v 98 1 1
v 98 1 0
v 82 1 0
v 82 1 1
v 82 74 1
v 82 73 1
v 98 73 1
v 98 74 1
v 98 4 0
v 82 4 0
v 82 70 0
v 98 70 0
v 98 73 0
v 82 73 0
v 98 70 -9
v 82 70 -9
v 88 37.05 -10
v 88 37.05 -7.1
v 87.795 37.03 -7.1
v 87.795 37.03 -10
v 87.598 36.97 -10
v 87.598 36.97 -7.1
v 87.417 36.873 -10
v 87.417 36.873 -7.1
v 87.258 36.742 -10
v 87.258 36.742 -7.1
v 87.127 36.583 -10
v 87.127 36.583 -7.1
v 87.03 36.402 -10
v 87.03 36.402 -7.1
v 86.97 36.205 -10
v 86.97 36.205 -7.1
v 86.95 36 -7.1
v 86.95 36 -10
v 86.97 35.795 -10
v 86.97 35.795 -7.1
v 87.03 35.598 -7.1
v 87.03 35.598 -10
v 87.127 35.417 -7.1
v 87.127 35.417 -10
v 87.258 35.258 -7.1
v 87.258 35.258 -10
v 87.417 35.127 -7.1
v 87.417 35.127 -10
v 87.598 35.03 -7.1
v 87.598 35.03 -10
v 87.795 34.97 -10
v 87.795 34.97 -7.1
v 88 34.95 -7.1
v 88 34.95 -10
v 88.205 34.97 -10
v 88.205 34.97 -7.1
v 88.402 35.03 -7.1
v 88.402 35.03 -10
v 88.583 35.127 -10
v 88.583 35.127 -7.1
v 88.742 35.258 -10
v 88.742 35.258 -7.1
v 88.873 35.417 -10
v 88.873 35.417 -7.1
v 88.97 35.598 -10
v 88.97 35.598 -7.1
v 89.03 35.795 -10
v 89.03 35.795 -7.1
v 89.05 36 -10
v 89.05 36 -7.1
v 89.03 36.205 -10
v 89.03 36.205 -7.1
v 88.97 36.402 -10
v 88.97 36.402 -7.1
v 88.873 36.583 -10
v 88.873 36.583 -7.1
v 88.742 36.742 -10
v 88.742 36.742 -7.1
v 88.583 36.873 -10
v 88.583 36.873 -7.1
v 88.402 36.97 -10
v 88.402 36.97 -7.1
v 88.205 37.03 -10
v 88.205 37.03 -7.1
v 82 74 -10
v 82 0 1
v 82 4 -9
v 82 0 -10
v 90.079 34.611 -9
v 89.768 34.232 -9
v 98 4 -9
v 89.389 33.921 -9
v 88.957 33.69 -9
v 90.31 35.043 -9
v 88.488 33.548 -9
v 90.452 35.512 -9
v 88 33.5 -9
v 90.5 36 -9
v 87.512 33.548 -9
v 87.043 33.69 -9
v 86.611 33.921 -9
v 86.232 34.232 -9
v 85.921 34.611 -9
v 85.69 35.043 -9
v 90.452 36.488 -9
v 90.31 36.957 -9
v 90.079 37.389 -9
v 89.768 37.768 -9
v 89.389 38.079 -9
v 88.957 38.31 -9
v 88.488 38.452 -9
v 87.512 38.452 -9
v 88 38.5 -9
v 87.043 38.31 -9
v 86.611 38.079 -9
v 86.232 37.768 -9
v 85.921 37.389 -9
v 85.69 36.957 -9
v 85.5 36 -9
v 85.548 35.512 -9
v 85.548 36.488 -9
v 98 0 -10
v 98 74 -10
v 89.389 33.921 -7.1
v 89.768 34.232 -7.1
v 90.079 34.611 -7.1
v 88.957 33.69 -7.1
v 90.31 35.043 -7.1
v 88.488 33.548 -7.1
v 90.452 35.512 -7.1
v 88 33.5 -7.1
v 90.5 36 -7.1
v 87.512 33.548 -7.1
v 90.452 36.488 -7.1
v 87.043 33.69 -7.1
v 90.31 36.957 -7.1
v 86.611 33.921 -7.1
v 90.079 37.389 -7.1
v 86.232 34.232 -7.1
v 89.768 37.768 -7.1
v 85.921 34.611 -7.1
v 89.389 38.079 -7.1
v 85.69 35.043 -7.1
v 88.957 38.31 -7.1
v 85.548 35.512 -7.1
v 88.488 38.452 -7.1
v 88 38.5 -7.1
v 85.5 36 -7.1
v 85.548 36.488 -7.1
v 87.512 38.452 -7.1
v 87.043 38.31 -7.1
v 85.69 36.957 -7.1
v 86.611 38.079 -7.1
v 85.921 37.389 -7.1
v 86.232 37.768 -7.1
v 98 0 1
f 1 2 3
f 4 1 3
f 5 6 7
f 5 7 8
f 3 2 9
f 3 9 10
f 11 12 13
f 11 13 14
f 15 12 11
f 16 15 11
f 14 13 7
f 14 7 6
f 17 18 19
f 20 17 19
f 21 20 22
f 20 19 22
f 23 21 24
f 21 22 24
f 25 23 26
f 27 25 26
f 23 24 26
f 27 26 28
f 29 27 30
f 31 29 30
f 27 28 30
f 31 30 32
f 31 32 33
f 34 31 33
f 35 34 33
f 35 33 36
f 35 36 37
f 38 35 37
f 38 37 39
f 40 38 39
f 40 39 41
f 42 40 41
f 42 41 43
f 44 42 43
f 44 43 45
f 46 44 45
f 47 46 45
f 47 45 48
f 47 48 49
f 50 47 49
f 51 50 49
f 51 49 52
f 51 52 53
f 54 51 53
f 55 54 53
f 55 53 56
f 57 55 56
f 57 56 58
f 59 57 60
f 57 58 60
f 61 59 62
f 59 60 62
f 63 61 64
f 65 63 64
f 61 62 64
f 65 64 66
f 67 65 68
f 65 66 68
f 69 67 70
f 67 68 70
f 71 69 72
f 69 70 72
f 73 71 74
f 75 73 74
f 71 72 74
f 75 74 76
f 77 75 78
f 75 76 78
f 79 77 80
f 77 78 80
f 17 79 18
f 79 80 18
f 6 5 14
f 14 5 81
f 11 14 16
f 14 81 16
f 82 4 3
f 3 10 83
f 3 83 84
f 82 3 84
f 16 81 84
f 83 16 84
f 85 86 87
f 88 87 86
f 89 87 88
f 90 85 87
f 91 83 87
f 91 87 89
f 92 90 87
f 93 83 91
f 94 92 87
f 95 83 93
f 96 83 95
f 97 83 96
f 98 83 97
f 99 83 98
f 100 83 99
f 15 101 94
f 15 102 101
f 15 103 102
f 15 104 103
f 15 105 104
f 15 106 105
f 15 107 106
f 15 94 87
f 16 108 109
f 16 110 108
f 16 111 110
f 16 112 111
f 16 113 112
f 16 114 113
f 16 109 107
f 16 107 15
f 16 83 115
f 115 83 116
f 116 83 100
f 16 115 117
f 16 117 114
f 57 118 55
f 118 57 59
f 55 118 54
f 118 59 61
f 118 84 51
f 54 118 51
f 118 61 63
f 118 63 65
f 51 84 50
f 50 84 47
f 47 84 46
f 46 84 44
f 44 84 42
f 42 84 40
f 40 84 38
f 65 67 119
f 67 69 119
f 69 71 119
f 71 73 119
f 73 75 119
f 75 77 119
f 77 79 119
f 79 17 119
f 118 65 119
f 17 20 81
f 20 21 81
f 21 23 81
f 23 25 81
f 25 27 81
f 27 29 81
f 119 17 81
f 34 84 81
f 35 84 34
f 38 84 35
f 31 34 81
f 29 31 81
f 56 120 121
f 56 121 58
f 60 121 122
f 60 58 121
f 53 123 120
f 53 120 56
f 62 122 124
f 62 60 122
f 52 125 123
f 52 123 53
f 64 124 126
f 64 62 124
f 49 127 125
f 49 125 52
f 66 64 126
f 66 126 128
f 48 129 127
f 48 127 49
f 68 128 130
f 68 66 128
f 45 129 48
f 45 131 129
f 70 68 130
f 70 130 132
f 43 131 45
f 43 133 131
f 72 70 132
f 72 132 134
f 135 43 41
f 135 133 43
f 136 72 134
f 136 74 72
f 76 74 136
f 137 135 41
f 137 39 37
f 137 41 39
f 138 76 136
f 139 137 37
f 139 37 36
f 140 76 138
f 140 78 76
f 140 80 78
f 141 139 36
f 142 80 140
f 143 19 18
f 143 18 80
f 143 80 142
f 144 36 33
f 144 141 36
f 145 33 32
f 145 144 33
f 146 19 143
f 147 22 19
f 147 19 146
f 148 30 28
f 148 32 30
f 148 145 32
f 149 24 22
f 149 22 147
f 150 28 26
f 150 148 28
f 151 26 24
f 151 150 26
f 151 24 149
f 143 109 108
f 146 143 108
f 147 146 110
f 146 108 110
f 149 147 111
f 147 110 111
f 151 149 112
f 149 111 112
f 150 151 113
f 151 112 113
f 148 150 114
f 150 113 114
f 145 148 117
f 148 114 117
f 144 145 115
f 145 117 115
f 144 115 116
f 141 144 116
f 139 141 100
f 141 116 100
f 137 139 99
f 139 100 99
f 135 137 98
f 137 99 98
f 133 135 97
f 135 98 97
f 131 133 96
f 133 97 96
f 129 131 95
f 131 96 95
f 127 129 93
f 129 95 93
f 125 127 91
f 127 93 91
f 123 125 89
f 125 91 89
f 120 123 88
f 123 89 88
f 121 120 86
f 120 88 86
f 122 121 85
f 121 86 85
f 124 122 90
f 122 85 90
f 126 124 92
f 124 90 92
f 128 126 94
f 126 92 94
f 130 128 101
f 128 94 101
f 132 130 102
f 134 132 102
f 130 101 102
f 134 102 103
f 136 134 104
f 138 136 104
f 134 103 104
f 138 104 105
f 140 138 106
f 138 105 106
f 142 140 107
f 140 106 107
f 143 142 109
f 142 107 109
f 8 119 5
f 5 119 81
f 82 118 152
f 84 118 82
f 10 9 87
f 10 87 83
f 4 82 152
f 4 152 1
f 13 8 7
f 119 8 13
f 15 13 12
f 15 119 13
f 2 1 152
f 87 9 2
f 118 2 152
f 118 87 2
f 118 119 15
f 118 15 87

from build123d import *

# Parameters (mm, degrees)
SKETCH019_W             = 74
SKETCH019_H             = 16
PAD013_DEPTH            = 1
SKETCH003_W             = 1
SKETCH003_H             = 16
PAD002_DEPTH            = 10
PAD002_FACE6_W          = 16
PAD002_FACE6_H          = 72
PAD012_DEPTH            = 9
SKETCH021_W             = 66
SKETCH021_H             = 16
POCKET008_DEPTH         = 9
SKETCH023_R             = 2.5
PAD010_DEPTH            = 1.9
SKETCH024_R             = 1.05
POCKET007_DEPTH         = 5
BODY005_PLACEMENT_ANGLE = 90


with BuildPart() as part:
    # Sketch019 → Pad013 (new body)
    with BuildSketch(Plane.XY):
        with Locations((35, 7)):
            Rectangle(SKETCH019_W, SKETCH019_H)
    extrude(amount=PAD013_DEPTH)

    # Sketch003 (on Face6 of Pad013) → Pad002 (join)
    with BuildSketch(Plane.XY.offset(1)):
        with Locations((-1.5, 7)):
            Rectangle(SKETCH003_W, SKETCH003_H)
        with Locations((71.5, 7)):
            Rectangle(SKETCH003_W, SKETCH003_H)
    extrude(amount=PAD002_DEPTH)

    # Pad002 Face6 → Pad012 (add)
    with BuildSketch(Plane(origin=(35, 7, 1), x_dir=(0, 1, 0), z_dir=(0, 0, 1))):
        Rectangle(PAD002_FACE6_W, PAD002_FACE6_H)
    extrude(amount=PAD012_DEPTH)

    # Sketch021 (on Face13 of Pad012) → Pocket008 (cut)
    with BuildSketch(Plane.XY.offset(10)):
        with Locations((35, 7)):
            Rectangle(SKETCH021_W, SKETCH021_H)
    extrude(amount=-POCKET008_DEPTH, mode=Mode.SUBTRACT)

    # Sketch023 (on Face7 of Pocket008) → Pad010 (join)
    with BuildSketch(Plane.XY.offset(1)):
        with Locations((34, 9)):
            Circle(SKETCH023_R)
    extrude(amount=PAD010_DEPTH)

    # Sketch024 (on Face26 of Pad010) → Pocket007 (cut)
    with BuildSketch(Plane.XY.offset(2.9)):
        with Locations((34, 9)):
            Circle(SKETCH024_R)
    extrude(amount=-POCKET007_DEPTH, mode=Mode.SUBTRACT)


with BuildPart() as part_1:
    # Body005 placement: moved
    add(part.part.moved(Location((97, 2, -10))).rotate(Axis((97, 2, -10), (0, 0, 1)), BODY005_PLACEMENT_ANGLE))


solid = part_1.part
